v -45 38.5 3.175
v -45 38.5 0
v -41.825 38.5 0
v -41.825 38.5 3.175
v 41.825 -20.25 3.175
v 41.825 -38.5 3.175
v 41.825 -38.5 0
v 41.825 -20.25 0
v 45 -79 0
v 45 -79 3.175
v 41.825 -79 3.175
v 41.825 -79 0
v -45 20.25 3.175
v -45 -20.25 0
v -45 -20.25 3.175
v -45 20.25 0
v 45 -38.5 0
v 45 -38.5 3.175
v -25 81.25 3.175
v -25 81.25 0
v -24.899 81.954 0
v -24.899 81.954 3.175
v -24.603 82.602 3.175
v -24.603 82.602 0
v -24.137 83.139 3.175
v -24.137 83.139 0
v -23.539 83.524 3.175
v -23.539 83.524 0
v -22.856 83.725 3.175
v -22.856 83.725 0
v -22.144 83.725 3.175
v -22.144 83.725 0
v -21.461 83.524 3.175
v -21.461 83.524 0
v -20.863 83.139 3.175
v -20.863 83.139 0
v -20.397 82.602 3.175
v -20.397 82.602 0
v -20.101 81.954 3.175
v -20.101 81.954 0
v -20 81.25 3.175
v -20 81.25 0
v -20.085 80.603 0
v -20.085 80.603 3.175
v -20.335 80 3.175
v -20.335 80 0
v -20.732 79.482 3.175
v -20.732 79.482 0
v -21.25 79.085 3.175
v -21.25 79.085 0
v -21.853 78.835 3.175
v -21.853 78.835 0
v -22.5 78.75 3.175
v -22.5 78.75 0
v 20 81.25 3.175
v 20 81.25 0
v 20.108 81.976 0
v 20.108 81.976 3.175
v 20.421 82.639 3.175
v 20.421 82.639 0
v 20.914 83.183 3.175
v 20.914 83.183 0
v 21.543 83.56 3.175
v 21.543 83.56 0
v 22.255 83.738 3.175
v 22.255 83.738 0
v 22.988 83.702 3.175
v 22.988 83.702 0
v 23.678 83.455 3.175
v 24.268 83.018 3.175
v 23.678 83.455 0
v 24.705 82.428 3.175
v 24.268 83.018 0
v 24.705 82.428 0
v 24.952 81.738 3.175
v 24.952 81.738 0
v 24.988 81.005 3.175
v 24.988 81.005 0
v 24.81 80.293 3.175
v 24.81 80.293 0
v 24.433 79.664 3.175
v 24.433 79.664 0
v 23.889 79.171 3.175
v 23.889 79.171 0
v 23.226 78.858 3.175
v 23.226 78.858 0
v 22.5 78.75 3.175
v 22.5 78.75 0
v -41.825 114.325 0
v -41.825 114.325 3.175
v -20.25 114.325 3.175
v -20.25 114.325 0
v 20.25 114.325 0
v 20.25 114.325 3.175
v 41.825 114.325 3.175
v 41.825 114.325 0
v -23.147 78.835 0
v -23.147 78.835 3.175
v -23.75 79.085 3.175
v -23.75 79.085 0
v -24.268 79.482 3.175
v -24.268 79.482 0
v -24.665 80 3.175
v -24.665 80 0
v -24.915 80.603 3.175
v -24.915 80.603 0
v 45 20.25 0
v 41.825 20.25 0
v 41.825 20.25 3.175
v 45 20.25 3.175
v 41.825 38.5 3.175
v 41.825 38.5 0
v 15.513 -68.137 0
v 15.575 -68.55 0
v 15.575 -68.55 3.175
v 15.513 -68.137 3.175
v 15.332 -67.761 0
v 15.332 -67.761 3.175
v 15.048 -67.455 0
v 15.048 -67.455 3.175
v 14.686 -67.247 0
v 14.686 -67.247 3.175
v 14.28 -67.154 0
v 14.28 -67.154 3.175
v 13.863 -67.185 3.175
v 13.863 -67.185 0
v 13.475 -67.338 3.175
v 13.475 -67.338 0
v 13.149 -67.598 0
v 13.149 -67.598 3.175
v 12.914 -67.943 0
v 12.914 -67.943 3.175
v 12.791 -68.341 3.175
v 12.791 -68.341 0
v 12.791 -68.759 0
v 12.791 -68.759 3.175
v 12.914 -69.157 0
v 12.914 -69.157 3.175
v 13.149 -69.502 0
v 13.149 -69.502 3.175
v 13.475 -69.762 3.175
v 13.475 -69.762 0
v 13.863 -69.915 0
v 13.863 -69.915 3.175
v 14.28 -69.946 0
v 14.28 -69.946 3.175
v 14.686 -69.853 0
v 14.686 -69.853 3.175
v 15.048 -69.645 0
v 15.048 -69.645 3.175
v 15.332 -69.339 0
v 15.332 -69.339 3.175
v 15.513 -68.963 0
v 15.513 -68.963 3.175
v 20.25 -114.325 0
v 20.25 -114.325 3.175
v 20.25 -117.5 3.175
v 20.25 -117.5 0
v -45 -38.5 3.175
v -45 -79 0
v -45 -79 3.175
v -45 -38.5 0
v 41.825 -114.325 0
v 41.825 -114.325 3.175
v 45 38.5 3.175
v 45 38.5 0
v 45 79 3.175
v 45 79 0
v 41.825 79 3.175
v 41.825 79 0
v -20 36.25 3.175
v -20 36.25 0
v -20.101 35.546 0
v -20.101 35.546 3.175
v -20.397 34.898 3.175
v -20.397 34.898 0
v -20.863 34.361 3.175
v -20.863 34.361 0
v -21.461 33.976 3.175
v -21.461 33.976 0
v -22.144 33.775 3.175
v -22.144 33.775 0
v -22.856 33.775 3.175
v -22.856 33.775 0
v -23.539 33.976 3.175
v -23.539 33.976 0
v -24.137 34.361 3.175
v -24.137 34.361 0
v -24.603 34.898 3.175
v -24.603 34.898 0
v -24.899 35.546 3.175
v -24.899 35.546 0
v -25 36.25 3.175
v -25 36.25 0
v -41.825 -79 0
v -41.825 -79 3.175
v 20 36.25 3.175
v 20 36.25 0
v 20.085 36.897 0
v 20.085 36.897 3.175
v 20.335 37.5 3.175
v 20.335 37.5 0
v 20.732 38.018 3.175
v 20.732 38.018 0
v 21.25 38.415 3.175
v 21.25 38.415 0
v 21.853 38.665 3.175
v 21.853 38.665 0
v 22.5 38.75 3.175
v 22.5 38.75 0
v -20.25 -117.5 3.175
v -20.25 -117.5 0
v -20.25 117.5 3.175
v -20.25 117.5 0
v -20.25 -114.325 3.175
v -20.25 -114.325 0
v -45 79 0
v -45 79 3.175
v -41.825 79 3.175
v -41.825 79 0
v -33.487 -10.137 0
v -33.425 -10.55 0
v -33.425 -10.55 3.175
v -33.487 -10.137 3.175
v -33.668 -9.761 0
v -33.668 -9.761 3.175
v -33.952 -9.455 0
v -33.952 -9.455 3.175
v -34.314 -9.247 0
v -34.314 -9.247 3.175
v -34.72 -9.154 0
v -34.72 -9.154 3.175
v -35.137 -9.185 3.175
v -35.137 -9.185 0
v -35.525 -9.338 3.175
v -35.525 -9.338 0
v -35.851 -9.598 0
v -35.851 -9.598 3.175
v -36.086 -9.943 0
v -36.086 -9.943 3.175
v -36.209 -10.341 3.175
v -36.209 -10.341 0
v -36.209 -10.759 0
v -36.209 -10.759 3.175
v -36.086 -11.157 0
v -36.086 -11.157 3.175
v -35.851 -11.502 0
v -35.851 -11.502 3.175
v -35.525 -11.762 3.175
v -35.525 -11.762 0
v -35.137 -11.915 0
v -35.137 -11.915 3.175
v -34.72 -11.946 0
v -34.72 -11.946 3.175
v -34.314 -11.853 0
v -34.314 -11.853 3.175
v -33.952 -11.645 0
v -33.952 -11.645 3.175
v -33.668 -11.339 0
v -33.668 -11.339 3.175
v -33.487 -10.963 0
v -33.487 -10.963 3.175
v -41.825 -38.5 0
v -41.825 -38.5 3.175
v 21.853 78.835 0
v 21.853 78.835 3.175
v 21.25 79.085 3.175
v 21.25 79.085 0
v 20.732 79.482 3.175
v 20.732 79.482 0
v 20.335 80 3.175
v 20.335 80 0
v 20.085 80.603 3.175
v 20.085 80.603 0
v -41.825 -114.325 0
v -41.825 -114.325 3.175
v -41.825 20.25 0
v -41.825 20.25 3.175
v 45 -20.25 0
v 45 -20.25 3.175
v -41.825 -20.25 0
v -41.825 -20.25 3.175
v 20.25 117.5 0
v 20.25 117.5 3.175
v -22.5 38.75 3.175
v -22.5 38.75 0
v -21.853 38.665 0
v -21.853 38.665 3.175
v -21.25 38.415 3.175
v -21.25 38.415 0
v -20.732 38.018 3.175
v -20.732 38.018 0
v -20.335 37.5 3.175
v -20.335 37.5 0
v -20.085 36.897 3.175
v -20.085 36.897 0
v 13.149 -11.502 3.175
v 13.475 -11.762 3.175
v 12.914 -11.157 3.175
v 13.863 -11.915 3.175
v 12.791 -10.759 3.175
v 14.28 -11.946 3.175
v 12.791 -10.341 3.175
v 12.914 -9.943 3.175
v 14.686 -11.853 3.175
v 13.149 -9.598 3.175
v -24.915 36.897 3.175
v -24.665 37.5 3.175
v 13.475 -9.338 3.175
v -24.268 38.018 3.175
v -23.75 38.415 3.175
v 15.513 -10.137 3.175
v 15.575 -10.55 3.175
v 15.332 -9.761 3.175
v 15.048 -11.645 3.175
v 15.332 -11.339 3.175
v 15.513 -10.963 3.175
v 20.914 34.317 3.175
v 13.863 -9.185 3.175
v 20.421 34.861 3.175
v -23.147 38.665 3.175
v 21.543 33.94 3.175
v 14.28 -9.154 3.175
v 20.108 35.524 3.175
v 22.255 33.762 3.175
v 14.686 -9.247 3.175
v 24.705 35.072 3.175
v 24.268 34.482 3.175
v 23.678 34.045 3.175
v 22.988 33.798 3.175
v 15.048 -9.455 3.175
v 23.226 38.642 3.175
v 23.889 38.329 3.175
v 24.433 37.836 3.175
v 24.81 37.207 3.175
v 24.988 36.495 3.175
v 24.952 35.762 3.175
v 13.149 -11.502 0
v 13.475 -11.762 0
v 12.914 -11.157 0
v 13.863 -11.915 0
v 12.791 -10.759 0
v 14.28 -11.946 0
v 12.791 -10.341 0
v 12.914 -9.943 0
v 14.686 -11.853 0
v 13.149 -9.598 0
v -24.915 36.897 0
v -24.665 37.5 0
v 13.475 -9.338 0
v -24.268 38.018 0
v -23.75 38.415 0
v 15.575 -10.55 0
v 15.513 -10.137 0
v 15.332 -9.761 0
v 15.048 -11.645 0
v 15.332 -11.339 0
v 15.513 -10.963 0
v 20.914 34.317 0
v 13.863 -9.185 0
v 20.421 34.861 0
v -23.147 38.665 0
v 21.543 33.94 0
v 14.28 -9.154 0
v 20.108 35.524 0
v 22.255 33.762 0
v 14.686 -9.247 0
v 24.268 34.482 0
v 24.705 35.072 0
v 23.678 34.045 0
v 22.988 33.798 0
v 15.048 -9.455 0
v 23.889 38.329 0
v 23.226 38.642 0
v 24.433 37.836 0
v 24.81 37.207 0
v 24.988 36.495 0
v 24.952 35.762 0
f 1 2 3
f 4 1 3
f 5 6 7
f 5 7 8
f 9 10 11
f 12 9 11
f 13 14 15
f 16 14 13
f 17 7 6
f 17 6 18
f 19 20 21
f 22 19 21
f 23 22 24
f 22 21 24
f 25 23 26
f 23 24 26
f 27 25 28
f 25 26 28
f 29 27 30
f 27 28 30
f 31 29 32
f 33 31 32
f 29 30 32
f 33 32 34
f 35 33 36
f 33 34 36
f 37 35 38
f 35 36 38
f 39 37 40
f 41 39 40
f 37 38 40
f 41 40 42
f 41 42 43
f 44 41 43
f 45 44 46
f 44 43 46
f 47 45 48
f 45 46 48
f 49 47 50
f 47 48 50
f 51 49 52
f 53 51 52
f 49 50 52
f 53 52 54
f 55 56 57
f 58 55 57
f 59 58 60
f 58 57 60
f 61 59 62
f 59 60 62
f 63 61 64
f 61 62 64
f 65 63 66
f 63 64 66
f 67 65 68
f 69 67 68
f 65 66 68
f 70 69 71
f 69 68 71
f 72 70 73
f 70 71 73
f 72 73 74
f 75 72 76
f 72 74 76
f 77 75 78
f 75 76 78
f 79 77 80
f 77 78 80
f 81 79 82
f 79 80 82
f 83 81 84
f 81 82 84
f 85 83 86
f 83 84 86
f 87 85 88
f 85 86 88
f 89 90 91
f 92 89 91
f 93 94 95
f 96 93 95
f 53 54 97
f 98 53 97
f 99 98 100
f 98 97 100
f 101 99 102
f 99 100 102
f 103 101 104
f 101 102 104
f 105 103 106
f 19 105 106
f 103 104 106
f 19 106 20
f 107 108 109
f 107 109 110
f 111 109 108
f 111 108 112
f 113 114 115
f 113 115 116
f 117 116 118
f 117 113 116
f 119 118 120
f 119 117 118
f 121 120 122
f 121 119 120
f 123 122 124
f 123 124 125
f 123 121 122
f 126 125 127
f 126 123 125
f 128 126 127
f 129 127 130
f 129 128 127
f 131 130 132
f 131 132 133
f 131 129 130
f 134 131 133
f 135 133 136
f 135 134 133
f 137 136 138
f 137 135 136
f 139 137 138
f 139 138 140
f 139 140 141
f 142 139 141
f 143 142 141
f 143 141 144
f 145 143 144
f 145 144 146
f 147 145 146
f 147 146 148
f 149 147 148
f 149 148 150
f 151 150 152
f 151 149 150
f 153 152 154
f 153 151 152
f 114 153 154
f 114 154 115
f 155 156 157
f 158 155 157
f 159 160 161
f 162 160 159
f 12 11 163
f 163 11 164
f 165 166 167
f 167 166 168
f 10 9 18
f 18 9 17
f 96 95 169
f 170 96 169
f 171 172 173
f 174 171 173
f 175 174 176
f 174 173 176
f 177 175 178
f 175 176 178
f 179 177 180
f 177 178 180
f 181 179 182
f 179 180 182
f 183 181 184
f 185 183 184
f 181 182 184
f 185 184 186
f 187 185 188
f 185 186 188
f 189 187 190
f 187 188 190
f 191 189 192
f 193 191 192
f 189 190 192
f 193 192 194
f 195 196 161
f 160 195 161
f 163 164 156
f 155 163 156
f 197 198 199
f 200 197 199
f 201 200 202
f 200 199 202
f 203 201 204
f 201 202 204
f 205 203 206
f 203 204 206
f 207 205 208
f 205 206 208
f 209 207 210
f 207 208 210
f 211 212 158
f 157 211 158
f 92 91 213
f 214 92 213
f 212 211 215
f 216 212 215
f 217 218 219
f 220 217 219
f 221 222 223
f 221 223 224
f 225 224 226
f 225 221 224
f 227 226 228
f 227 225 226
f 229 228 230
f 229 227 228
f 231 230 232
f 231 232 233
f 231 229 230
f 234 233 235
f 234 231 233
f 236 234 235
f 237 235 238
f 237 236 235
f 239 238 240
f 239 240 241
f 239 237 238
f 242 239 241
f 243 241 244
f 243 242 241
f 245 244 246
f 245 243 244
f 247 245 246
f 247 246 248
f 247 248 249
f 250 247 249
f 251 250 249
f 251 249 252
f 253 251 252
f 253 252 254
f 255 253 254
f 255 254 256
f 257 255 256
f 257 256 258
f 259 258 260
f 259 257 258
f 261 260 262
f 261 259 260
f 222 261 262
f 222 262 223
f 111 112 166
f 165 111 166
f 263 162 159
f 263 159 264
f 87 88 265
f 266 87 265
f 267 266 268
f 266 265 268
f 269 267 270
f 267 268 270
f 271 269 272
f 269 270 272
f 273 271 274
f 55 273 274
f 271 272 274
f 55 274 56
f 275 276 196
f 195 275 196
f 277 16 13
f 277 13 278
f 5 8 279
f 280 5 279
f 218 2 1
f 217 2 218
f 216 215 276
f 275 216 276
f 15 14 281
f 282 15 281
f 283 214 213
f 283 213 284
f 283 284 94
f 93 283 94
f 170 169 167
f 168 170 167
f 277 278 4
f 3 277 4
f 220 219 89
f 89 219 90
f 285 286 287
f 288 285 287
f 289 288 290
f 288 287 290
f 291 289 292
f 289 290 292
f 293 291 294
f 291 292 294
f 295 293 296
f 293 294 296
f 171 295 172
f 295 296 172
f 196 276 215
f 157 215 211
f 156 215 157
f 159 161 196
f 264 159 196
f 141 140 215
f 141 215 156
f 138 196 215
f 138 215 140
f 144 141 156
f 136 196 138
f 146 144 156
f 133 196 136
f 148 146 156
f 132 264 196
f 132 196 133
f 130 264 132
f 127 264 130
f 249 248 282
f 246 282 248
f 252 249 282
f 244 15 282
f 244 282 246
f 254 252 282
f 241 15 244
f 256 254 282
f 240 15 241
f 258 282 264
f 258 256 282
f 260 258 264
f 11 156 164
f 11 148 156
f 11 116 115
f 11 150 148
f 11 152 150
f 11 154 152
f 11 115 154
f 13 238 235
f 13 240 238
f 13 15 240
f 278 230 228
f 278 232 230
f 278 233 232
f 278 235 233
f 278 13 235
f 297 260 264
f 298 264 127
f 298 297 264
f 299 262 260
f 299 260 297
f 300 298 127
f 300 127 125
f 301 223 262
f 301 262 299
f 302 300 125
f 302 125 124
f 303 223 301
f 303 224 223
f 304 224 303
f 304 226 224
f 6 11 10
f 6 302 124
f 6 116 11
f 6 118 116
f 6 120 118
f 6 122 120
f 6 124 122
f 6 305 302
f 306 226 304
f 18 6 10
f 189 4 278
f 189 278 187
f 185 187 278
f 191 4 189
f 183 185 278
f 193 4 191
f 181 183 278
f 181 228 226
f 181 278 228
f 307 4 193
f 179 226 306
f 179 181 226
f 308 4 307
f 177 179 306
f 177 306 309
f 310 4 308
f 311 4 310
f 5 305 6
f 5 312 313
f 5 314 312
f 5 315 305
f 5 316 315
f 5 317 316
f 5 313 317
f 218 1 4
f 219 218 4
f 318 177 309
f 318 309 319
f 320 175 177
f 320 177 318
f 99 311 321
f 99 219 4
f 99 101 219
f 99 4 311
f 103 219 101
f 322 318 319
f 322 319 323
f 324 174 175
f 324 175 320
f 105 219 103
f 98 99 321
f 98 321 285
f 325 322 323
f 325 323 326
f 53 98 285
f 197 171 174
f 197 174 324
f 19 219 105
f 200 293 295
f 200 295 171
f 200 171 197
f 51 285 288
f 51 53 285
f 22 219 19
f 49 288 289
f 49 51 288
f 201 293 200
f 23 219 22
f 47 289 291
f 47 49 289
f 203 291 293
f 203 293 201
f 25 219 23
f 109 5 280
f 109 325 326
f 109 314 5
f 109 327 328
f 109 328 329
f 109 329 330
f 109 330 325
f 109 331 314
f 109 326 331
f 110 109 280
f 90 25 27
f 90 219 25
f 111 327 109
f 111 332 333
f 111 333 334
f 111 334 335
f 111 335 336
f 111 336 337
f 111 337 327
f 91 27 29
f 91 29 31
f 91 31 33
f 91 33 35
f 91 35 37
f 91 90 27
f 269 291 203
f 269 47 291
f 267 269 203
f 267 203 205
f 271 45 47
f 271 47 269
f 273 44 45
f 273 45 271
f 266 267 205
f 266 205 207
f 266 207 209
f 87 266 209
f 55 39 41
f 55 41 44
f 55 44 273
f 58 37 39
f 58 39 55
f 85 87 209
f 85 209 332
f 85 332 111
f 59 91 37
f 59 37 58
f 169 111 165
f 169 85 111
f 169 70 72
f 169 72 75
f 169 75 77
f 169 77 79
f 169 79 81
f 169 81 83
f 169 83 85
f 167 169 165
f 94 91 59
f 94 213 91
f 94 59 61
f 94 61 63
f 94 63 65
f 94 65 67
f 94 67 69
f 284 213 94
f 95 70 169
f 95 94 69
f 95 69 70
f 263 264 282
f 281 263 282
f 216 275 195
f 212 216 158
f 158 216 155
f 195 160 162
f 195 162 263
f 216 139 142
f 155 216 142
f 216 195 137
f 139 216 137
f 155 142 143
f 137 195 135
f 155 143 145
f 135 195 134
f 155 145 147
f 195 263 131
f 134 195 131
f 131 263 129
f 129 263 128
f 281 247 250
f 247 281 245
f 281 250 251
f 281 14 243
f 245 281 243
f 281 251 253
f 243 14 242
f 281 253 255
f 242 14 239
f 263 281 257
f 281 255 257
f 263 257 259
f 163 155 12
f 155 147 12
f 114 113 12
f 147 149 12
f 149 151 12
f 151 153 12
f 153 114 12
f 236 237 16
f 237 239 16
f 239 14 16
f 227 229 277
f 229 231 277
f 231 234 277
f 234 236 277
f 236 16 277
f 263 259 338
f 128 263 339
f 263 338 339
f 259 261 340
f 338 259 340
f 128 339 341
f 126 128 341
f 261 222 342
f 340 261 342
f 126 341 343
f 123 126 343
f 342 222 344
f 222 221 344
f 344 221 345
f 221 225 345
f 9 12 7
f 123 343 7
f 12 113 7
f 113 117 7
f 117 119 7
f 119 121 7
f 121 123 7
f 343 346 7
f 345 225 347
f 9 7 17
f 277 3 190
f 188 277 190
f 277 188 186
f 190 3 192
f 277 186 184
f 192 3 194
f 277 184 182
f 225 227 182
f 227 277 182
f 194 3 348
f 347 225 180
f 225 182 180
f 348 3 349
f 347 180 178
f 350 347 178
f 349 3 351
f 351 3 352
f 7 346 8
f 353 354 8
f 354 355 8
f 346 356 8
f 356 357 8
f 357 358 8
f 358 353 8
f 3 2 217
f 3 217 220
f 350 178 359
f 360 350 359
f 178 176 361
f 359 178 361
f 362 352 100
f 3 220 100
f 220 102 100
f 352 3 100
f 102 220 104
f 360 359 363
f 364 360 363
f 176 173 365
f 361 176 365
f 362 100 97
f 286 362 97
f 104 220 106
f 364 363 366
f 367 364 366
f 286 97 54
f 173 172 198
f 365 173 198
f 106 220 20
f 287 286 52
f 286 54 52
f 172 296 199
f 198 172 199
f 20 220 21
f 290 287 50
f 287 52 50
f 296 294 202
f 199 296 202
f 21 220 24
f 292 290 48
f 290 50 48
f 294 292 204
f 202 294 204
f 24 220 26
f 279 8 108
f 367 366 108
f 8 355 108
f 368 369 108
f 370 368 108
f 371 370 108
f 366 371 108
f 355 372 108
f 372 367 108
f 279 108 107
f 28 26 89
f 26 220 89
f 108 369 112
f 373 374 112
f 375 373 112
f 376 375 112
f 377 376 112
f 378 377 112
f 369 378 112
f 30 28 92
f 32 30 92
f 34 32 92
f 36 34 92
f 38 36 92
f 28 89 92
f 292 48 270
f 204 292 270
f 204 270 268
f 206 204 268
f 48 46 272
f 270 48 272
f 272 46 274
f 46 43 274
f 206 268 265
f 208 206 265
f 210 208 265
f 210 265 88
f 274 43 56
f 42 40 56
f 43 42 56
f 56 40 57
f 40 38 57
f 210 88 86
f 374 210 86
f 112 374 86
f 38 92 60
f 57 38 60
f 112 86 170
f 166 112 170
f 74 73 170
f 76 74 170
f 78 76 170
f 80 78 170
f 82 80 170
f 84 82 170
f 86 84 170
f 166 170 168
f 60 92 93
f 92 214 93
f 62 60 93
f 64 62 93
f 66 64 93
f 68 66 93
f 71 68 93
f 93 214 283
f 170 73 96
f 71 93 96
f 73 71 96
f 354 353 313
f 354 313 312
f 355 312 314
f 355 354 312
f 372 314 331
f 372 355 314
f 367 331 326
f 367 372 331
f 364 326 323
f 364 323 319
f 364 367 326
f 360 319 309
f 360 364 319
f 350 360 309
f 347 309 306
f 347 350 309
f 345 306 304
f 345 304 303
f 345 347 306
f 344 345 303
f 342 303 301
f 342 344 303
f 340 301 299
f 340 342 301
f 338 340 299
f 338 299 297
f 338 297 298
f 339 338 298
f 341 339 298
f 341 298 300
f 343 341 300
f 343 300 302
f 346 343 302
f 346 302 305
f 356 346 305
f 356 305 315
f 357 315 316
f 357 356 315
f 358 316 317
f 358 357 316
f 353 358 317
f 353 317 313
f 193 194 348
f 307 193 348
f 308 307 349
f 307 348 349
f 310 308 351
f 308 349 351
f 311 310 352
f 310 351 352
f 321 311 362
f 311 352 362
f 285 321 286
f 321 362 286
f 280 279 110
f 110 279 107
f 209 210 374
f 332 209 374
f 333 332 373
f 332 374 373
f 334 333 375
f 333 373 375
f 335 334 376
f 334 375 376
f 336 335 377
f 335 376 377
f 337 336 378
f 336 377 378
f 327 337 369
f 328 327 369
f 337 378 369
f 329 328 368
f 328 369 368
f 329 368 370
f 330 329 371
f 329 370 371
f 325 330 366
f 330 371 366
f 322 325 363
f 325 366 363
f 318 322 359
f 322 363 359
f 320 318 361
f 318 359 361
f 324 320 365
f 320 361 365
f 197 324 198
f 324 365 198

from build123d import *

# Parameters (mm, degrees)
SKETCH1_W           = 90
SKETCH1_H           = 235
SKETCH1_W_2         = 38
SKETCH1_H_2         = 49.5
SKETCH1_W_3         = 17
SKETCH1_H_3         = 26
SKETCH1_W_4         = 0.938488567
SKETCH1_R           = 1.4
SKETCH1_W_5         = 23.15
SKETCH1_H_4         = 81
SKETCH1_W_6         = 27.85
SKETCH1_W_7         = 35.5
SKETCH1_H_5         = 15
BOSS_EXTRUDE2_DEPTH = 3.175
SKETCH4_W           = 3.175
SKETCH4_H           = 18.25
CUT_EXTRUDE2_DEPTH  = 3.175
CUT_EXTRUDE3_DEPTH  = 4.175


with BuildPart() as part:
    # Sketch1 → Boss-Extrude2 (new body)
    with BuildSketch(Plane.XY):
        Rectangle(SKETCH1_W, SKETCH1_H)
        Polygon((-4.325, -114.325), (-39.825, -114.325), (-39.825, -99.325), (-41.825, -99.325), (-41.825, -96.15), (41.825, -96.15), (41.825, -99.325), (39.825, -99.325), (39.825, -114.325), (4.325, -114.325), (4.325, -99.325), (-4.325, -99.325), align=None, mode=Mode.SUBTRACT)
        Polygon((17.675, -94.15), (-10.175, -94.15), (-40.825, -94.15), (-40.825, -7.05), (17.675, -7.05), (17.675, -13.15), (40.825, -13.15), (40.825, -94.15), align=None, mode=Mode.SUBTRACT)
        with Locations((-22.825, 82.5)):
            Rectangle(SKETCH1_W_2, SKETCH1_H_2, mode=Mode.SUBTRACT)
        Polygon((23.761826634, 14.5), (6.761826634, 14.5), (6.761826634, 40.5), (23.761826634, 40.5), (24.700315201, 40.5), (41.700315201, 40.5), (41.700315201, 14.5), (24.700315201, 14.5), align=None, mode=Mode.SUBTRACT)
        with Locations((22.825, 82.5)):
            Rectangle(SKETCH1_W_2, SKETCH1_H_2, mode=Mode.SUBTRACT)
        with Locations((-22.825, 82.5)):
            Rectangle(SKETCH1_W_2, SKETCH1_H_2)
        with Locations((22.825, 82.5)):
            Rectangle(SKETCH1_W_2, SKETCH1_H_2)
        with Locations((33.200315201, 27.5)):
            Rectangle(SKETCH1_W_3, SKETCH1_H_3)
        with Locations((15.261826634, 27.5)):
            Rectangle(SKETCH1_W_3, SKETCH1_H_3)
        with Locations((24.231070918, 27.5)):
            Rectangle(SKETCH1_W_4, SKETCH1_H_3)
        Polygon((-40.825, -94.15), (-10.175, -94.15), (-10.175, -13.15), (17.675, -13.15), (17.675, -7.05), (-40.825, -7.05), align=None)
        with Locations((-34.825, -10.55)):
            Circle(SKETCH1_R, mode=Mode.SUBTRACT)
        with Locations((14.175, -10.55)):
            Circle(SKETCH1_R, mode=Mode.SUBTRACT)
        with Locations((29.25, -53.65)):
            Rectangle(SKETCH1_W_5, SKETCH1_H_4)
        with Locations((37.325, -90.65)):
            Circle(SKETCH1_R, mode=Mode.SUBTRACT)
        with Locations((37.325, -19.53)):
            Circle(SKETCH1_R, mode=Mode.SUBTRACT)
        with Locations((3.75, -53.65)):
            Rectangle(SKETCH1_W_6, SKETCH1_H_4)
        with Locations((14.175, -68.55)):
            Circle(SKETCH1_R, mode=Mode.SUBTRACT)
        with Locations((-22.075, -106.825)):
            Rectangle(SKETCH1_W_7, SKETCH1_H_5)
        with Locations((22.075, -106.825)):
            Rectangle(SKETCH1_W_7, SKETCH1_H_5)
        Polygon((-41.825, -99.325), (-39.825, -99.325), (-4.325, -99.325), (4.325, -99.325), (39.825, -99.325), (41.825, -99.325), (41.825, -96.15), (-41.825, -96.15), align=None)
        with Locations((37.325, -19.53)):
            Circle(SKETCH1_R)
        with Locations((37.325, -90.65)):
            Circle(SKETCH1_R)
    extrude(amount=BOSS_EXTRUDE2_DEPTH)

    # Sketch4 → Cut-Extrude2 (cut)
    with BuildSketch(Plane.XY.offset(3.175)):
        Polygon((-41.825, 114.325), (-20.25, 114.325), (-20.25, 117.5), (-45, 117.5), (-45, 79), (-41.825, 79), align=None)
        Polygon((41.825, 114.325), (41.825, 79), (45, 79), (45, 117.5), (20.25, 117.5), (20.25, 114.325), align=None)
        with Locations((-43.4125, 29.375)):
            Rectangle(SKETCH4_W, SKETCH4_H)
        with Locations((-43.4125, -29.375)):
            Rectangle(SKETCH4_W, SKETCH4_H)
        Polygon((-20.25, -117.5), (-20.25, -114.325), (-41.825, -114.325), (-41.825, -79), (-45, -79), (-45, -117.5), align=None)
        Polygon((45, -79), (41.825, -79), (41.825, -114.325), (20.25, -114.325), (20.25, -117.5), (45, -117.5), align=None)
        with Locations((43.4125, -29.375)):
            Rectangle(SKETCH4_W, SKETCH4_H)
        with Locations((43.4125, 29.375)):
            Rectangle(SKETCH4_W, SKETCH4_H)
    extrude(amount=-CUT_EXTRUDE2_DEPTH, mode=Mode.SUBTRACT)

    # Sketch5 → Cut-Extrude3 (cut, through all)
    with BuildSketch(Plane(origin=(0, 0, 0), x_dir=(-1, 0, 0), z_dir=(0, 0, -1))):
        with BuildLine():
            Line((-22.5, 38.75), (-22.5, 36.25))
            Line((-22.5, 36.25), (-20, 36.25))
            ThreePointArc((-20, 36.25), (-20.732233047, 38.017766953), (-22.5, 38.75))
        make_face()
        with BuildLine():
            Line((-20, 36.25), (-22.5, 36.25))
            Line((-22.5, 36.25), (-22.5, 38.75))
            ThreePointArc((-22.5, 38.75), (-24.267766953, 34.482233047), (-20, 36.25))
        make_face()
        with BuildLine():
            ThreePointArc((22.5, 38.75), (20.732233047, 38.017766953), (20, 36.25))
            Line((20, 36.25), (22.5, 36.25))
            Line((22.5, 36.25), (22.5, 38.75))
        make_face()
        with BuildLine():
            Line((22.5, 36.25), (20, 36.25))
            ThreePointArc((20, 36.25), (22.5, 33.75), (25, 36.25))
            ThreePointArc((25, 36.25), (24.267766953, 38.017766953), (22.5, 38.75))
            Line((22.5, 38.75), (22.5, 36.25))
        make_face()
        with BuildLine():
            ThreePointArc((20, 81.25), (20.732233047, 79.482233047), (22.5, 78.75))
            Line((22.5, 78.75), (22.5, 81.25))
            Line((22.5, 81.25), (20, 81.25))
        make_face()
        with BuildLine():
            Line((22.5, 81.25), (22.5, 78.75))
            ThreePointArc((22.5, 78.75), (24.267766953, 79.482233047), (25, 81.25))
            ThreePointArc((25, 81.25), (22.5, 83.75), (20, 81.25))
            Line((20, 81.25), (22.5, 81.25))
        make_face()
        with BuildLine():
            ThreePointArc((-20, 81.25), (-24.267766953, 83.017766953), (-22.5, 78.75))
            Line((-22.5, 78.75), (-22.5, 81.25))
            Line((-22.5, 81.25), (-20, 81.25))
        make_face()
        with BuildLine():
            Line((-22.5, 81.25), (-22.5, 78.75))
            ThreePointArc((-22.5, 78.75), (-20.732233047, 79.482233047), (-20, 81.25))
            Line((-20, 81.25), (-22.5, 81.25))
        make_face()
    extrude(amount=-CUT_EXTRUDE3_DEPTH, mode=Mode.SUBTRACT)


solid = part.part
